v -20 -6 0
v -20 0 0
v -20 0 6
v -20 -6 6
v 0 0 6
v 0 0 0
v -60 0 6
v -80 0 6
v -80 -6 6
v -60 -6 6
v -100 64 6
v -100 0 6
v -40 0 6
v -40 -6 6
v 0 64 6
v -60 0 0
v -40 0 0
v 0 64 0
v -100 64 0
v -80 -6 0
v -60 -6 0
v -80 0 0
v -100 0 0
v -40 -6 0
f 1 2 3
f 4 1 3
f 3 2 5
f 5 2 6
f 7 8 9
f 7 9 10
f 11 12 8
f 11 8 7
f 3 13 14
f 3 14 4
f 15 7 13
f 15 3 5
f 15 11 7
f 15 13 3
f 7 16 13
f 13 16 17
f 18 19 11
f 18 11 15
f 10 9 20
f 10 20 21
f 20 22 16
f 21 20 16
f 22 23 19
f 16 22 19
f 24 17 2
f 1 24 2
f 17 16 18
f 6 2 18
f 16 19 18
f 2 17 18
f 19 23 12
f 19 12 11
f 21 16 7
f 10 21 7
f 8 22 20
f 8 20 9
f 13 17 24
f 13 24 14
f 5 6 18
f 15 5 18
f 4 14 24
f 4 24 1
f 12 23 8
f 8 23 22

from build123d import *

# Parameters (mm, degrees)
ESQUISSE1_W        = 100
ESQUISSE1_H        = 64
BOSS_EXTRU_1_DEPTH = 6
ESQUISSE2_W        = 20
ESQUISSE2_H        = 6
BOSS_EXTRU_2_DEPTH = 6


with BuildPart() as part:
    # Esquisse1 → Boss.-Extru.1 (new body)
    with BuildSketch(Plane.XY):
        with Locations((-50, 32)):
            Rectangle(ESQUISSE1_W, ESQUISSE1_H)
    extrude(amount=BOSS_EXTRU_1_DEPTH)

    # Esquisse2 → Boss.-Extru.2 (add)
    with BuildSketch(Plane.XZ):
        with Locations((-70, 3)):
            Rectangle(ESQUISSE2_W, ESQUISSE2_H)
        with Locations((-30, 3)):
            Rectangle(ESQUISSE2_W, ESQUISSE2_H)
    extrude(amount=BOSS_EXTRU_2_DEPTH)


solid = part.part
